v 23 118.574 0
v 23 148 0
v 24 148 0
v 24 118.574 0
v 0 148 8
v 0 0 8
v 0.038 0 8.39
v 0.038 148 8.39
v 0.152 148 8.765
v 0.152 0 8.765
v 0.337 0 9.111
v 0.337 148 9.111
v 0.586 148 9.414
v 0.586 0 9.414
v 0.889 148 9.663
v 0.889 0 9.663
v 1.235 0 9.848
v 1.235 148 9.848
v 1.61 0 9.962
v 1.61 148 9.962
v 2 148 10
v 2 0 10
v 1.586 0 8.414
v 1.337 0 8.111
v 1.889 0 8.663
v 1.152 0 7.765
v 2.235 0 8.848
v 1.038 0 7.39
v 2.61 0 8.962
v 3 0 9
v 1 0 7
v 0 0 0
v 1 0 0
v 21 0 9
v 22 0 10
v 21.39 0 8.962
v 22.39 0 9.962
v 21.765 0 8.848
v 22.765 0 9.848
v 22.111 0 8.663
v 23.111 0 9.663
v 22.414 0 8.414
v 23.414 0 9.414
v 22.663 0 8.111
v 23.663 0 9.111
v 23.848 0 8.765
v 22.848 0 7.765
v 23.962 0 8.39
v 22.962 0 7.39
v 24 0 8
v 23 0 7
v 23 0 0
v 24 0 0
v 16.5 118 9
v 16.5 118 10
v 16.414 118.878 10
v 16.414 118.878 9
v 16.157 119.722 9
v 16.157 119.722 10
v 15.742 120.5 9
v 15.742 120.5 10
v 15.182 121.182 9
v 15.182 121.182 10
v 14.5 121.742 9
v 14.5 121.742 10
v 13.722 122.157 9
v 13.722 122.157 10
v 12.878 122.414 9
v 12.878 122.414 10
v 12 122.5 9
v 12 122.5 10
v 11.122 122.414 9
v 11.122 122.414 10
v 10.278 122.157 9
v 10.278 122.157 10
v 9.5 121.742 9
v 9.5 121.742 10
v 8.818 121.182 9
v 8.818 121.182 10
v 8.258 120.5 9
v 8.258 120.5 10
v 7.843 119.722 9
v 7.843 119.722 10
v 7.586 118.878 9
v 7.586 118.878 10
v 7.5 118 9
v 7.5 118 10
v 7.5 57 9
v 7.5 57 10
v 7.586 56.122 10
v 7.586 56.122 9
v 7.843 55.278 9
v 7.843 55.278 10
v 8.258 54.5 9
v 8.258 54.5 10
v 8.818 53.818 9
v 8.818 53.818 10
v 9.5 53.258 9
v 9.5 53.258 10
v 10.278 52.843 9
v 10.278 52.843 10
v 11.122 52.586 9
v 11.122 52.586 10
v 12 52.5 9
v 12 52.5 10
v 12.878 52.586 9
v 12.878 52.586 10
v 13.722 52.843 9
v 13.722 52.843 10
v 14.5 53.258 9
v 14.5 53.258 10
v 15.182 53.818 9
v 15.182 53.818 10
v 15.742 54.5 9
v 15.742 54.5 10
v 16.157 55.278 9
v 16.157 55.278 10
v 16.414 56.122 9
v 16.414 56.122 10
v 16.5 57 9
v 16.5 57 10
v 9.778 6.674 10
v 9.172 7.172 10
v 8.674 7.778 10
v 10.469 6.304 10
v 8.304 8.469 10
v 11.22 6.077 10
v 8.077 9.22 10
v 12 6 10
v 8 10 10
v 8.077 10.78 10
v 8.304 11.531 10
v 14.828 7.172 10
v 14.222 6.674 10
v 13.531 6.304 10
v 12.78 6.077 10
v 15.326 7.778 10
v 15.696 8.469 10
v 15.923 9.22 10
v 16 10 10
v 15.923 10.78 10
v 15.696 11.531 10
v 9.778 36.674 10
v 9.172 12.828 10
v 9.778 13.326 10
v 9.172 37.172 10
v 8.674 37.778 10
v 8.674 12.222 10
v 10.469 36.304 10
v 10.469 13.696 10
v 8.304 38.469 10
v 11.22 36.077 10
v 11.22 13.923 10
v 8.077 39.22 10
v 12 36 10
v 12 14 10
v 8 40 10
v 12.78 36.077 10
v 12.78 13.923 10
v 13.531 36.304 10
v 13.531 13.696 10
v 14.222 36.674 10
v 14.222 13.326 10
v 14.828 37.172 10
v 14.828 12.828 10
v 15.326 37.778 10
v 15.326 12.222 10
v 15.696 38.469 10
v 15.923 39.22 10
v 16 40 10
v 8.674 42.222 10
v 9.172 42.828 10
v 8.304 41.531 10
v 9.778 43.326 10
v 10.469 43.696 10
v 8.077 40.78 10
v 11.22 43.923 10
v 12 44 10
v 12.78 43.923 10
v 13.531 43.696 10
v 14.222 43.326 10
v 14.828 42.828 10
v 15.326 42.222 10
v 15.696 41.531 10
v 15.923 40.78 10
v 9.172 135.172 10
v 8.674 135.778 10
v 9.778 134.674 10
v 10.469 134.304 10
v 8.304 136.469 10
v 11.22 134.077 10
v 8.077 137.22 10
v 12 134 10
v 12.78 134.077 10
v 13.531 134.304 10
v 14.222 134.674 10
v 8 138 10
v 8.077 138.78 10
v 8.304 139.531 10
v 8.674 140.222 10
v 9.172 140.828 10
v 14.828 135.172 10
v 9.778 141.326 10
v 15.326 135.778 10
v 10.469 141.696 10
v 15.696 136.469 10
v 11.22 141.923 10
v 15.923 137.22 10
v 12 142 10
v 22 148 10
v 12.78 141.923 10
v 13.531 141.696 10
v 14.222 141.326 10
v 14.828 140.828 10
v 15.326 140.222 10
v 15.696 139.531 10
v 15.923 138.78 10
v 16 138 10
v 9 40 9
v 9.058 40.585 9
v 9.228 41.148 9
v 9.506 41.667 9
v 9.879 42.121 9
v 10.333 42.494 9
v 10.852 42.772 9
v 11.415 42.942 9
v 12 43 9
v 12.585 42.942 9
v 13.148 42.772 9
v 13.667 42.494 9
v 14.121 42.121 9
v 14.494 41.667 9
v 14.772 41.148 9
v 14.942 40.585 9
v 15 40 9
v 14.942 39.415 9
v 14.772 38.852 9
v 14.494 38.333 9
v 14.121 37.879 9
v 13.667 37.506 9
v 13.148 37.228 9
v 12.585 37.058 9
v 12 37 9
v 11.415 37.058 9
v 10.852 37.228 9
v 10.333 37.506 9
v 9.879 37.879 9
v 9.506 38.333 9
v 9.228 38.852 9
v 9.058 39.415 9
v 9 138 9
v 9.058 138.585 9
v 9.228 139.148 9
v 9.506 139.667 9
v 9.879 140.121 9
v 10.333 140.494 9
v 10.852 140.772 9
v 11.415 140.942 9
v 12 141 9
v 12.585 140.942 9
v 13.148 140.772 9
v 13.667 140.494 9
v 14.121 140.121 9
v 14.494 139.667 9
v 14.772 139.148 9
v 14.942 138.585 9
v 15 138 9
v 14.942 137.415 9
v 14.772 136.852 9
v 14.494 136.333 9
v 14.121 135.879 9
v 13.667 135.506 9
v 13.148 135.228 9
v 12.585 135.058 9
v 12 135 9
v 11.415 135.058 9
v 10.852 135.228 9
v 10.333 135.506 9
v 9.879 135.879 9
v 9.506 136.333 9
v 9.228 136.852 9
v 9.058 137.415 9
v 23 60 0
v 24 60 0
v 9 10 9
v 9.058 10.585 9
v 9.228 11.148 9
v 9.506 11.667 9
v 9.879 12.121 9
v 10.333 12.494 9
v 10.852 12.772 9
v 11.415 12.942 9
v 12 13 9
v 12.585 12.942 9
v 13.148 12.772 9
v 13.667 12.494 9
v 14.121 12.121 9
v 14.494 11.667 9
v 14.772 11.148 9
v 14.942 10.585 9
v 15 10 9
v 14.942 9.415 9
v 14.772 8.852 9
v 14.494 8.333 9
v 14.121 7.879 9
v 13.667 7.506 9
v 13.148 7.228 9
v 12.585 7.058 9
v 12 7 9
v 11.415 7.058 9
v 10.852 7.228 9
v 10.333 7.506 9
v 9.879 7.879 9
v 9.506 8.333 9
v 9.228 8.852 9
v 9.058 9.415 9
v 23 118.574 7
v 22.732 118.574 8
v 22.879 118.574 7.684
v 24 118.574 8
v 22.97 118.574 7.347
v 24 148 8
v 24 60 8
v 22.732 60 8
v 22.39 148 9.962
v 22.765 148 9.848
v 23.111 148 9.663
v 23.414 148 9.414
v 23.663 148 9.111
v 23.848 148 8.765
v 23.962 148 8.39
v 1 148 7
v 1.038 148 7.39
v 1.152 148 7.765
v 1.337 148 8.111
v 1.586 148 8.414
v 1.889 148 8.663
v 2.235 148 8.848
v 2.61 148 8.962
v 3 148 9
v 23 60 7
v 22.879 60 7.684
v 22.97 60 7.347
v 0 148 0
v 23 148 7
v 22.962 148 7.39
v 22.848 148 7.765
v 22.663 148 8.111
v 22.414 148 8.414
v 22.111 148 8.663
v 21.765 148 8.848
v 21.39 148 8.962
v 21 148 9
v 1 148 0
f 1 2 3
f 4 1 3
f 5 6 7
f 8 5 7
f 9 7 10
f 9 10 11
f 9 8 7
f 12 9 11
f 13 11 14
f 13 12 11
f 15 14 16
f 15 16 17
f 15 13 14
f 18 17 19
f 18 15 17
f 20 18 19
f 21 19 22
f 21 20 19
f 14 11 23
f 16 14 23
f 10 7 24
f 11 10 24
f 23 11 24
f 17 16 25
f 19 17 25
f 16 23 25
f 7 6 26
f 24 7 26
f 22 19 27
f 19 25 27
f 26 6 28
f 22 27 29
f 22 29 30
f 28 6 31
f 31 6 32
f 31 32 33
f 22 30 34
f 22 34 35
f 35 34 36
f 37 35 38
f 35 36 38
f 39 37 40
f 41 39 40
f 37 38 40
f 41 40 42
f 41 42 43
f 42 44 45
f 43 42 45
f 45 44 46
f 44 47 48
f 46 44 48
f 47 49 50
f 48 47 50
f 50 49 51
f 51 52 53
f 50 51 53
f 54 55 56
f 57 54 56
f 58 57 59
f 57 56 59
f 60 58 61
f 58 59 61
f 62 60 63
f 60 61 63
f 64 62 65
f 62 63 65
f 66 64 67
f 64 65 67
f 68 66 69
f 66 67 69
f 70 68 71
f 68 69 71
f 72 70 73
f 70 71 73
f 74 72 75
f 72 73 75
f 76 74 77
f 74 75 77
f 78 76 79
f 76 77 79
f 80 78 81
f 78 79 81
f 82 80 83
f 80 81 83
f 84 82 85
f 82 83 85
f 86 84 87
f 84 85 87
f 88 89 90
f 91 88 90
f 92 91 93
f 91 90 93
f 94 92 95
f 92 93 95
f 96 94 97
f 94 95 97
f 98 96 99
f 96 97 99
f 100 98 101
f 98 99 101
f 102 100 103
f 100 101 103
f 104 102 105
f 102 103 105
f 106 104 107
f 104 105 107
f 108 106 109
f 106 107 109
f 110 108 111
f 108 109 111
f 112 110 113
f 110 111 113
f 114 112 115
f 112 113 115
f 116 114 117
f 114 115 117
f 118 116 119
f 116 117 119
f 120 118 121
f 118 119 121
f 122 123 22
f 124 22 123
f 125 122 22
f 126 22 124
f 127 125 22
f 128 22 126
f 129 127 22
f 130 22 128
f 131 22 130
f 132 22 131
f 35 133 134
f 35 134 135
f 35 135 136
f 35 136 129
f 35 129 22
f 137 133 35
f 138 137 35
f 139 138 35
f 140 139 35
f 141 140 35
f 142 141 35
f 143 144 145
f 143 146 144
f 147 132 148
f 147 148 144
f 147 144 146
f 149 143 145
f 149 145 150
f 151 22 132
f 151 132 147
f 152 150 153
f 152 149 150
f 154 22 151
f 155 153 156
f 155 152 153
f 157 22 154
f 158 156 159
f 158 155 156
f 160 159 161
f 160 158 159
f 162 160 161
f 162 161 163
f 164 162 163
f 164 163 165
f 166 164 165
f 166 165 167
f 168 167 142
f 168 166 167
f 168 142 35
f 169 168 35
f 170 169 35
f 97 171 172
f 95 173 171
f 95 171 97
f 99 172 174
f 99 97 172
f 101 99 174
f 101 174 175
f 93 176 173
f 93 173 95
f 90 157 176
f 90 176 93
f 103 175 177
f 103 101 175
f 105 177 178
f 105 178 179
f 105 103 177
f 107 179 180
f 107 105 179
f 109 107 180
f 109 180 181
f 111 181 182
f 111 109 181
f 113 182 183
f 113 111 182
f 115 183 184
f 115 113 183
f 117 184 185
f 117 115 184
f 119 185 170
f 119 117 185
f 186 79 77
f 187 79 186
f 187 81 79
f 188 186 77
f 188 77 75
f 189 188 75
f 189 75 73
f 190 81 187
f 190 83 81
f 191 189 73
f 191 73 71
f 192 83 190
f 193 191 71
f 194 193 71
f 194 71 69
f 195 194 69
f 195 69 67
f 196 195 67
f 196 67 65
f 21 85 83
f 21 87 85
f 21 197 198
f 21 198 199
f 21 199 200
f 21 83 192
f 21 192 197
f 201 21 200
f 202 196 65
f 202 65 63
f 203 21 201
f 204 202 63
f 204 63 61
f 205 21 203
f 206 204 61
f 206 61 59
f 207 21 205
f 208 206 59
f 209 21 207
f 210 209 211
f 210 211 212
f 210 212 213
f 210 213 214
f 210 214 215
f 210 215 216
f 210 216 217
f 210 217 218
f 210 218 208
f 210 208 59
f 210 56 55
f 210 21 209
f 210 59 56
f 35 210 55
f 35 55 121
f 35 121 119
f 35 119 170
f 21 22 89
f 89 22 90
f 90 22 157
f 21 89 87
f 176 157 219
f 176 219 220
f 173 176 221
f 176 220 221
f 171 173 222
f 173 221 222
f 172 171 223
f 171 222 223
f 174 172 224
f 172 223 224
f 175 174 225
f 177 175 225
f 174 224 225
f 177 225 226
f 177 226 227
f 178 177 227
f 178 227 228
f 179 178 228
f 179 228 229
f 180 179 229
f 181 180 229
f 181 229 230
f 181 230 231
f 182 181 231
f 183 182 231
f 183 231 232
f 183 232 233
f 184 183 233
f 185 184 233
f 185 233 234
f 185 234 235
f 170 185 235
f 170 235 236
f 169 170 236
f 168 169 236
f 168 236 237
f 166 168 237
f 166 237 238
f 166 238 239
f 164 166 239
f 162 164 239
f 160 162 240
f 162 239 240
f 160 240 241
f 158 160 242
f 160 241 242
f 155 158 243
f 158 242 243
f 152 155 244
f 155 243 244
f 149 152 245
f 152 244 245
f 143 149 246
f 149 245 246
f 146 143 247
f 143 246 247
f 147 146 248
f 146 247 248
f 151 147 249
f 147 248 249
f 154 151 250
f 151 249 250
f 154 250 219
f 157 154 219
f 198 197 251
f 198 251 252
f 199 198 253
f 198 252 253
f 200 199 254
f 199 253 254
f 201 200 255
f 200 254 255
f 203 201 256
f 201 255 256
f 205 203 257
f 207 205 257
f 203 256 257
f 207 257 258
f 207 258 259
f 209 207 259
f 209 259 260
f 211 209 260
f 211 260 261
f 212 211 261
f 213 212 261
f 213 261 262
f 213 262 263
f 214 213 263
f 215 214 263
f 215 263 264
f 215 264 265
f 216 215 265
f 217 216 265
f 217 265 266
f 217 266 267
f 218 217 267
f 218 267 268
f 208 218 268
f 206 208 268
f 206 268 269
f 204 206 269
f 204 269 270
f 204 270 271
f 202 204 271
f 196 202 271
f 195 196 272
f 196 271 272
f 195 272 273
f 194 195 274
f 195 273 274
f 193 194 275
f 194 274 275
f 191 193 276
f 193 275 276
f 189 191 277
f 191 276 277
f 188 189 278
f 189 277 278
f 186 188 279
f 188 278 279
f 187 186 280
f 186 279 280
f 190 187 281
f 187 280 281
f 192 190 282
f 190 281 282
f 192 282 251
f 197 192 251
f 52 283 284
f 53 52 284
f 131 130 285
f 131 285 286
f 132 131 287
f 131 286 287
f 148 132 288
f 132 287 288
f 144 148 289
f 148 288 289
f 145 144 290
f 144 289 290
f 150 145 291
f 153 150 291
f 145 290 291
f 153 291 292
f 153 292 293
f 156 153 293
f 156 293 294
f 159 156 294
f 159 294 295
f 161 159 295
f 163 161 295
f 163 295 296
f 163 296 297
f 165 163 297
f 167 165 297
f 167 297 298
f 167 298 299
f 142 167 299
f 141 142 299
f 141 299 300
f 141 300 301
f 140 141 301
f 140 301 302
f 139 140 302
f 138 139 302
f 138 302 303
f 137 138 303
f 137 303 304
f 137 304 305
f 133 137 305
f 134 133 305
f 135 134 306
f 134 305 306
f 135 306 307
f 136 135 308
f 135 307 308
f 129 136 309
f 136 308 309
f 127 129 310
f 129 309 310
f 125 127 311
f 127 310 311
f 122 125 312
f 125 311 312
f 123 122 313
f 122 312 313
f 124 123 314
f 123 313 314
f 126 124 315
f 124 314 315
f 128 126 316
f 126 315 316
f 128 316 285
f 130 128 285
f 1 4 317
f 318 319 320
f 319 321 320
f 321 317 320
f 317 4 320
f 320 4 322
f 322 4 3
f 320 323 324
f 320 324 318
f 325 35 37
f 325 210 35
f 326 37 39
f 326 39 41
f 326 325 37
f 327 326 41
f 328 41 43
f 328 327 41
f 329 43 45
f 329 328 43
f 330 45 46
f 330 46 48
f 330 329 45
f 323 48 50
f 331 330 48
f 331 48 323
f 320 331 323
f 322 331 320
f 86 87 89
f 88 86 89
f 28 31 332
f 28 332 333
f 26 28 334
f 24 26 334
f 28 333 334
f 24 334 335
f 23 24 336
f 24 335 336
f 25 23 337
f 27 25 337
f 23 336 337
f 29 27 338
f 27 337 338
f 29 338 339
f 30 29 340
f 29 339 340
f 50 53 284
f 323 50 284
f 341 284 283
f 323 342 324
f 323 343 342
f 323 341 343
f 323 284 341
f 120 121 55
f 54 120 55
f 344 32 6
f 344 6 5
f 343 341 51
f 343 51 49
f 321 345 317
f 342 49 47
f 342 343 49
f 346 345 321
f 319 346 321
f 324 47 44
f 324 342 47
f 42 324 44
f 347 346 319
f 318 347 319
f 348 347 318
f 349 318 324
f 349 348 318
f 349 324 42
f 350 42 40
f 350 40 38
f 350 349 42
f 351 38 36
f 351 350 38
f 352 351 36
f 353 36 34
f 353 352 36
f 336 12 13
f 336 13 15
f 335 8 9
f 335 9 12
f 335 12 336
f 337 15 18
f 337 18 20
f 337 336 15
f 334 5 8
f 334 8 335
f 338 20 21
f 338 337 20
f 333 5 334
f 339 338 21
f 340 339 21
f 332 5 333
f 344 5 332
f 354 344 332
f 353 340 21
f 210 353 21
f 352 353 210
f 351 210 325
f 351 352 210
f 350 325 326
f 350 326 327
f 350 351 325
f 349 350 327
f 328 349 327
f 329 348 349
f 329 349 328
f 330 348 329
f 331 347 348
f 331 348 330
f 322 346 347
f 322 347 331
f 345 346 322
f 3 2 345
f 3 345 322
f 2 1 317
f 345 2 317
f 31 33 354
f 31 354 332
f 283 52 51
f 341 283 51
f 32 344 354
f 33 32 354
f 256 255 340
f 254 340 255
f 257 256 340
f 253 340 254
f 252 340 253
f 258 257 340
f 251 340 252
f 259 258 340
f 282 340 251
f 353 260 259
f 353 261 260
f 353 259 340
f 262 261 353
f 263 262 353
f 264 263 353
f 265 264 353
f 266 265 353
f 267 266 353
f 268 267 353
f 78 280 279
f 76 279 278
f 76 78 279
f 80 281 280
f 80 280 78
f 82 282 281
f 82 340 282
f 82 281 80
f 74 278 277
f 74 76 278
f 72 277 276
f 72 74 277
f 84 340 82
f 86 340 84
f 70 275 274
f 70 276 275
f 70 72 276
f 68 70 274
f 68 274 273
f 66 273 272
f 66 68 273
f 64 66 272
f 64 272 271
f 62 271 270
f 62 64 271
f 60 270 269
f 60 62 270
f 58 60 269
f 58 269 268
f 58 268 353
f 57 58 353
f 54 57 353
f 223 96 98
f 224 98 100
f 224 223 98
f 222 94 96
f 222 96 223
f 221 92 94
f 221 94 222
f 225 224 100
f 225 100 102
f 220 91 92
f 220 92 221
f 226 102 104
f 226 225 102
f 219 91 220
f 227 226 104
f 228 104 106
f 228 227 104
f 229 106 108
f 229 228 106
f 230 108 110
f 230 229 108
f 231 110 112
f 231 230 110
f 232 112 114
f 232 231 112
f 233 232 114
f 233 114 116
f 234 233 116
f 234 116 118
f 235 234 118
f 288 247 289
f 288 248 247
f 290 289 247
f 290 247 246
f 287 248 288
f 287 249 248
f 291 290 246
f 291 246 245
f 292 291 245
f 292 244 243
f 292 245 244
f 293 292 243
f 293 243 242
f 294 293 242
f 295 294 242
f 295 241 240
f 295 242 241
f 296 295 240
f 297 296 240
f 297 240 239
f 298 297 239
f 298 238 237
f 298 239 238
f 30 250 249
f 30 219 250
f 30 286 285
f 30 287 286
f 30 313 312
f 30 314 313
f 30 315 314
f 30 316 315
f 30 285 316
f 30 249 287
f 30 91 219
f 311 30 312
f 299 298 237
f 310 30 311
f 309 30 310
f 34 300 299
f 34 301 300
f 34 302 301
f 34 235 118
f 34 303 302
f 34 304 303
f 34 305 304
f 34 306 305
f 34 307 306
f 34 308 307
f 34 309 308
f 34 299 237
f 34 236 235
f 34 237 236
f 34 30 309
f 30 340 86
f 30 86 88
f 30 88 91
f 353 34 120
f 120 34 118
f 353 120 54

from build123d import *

# Parameters (mm, degrees)
F0_W            = 24
F0_H            = 148
F1_DEPTH        = 10
F2_R            = 2
F3_W            = 22
F3_H            = 9
F4_DEPTH        = 148
F5_R            = 2
F7_DEPTH        = 1
F8_R            = 2
F9_R            = 2
F11_D           = 5
F11_CSINK_D     = 8
F11_CSINK_ANGLE = 90
F13_W           = 58.5735701025
F13_H           = 8
F14_DEPTH       = 1.2689491924


with BuildPart() as f1:
    # F0 (on Top) → F1 (new body)
    with BuildSketch(Plane.XY):
        with Locations((12, 74)):
            Rectangle(F0_W, F0_H)
    extrude(amount=F1_DEPTH)

    # F2
    f2_edges = [f1.edges().sort_by_distance(p)[0] for p in [
        (0, 74, 10),
    ]]
    fillet(f2_edges, radius=F2_R)

    # F3 (on face) → F4 (cut, through all)
    with BuildSketch(Plane.XZ):
        with Locations((12, 4.5)):
            Rectangle(F3_W, F3_H)
    extrude(amount=-F4_DEPTH, mode=Mode.SUBTRACT)

    # F5
    f5_edges = [f1.edges().sort_by_distance(p)[0] for p in [
        (1, 74, 9),
    ]]
    fillet(f5_edges, radius=F5_R)

    # F6 (on face) → F7 (cut, through all)
    with BuildSketch(Plane.XY.offset(10)):
        with BuildLine():
            Line((16.5, 57), (16.5, 118))
            ThreePointArc((16.5, 118), (12, 122.5), (7.5, 118))
            Line((7.5, 118), (7.5, 57))
            ThreePointArc((7.5, 57), (12, 52.5), (16.5, 57))
        make_face()
    extrude(amount=-F7_DEPTH, mode=Mode.SUBTRACT)

    # F8
    f8_edges = [f1.edges().sort_by_distance(p)[0] for p in [
        (24, 74, 10),
    ]]
    fillet(f8_edges, radius=F8_R)

    # F9
    f9_edges = [f1.edges().sort_by_distance(p)[0] for p in [
        (23, 74, 9),
    ]]
    fillet(f9_edges, radius=F9_R)

    # F11 (through all)
    with Locations(Plane.XY.offset(10)):
        with Locations((12, 138), (12, 40), (12, 10)):
            CounterSinkHole(F11_D / 2, F11_CSINK_D / 2, counter_sink_angle=F11_CSINK_ANGLE)

    # F13 (on face) → F14 (cut, through all)
    with BuildSketch(Plane.YZ.offset(24)):
        with Locations((89.2871636897, 4)):
            Rectangle(F13_W, F13_H)
    extrude(amount=-F14_DEPTH, mode=Mode.SUBTRACT)


solid = f1.part
